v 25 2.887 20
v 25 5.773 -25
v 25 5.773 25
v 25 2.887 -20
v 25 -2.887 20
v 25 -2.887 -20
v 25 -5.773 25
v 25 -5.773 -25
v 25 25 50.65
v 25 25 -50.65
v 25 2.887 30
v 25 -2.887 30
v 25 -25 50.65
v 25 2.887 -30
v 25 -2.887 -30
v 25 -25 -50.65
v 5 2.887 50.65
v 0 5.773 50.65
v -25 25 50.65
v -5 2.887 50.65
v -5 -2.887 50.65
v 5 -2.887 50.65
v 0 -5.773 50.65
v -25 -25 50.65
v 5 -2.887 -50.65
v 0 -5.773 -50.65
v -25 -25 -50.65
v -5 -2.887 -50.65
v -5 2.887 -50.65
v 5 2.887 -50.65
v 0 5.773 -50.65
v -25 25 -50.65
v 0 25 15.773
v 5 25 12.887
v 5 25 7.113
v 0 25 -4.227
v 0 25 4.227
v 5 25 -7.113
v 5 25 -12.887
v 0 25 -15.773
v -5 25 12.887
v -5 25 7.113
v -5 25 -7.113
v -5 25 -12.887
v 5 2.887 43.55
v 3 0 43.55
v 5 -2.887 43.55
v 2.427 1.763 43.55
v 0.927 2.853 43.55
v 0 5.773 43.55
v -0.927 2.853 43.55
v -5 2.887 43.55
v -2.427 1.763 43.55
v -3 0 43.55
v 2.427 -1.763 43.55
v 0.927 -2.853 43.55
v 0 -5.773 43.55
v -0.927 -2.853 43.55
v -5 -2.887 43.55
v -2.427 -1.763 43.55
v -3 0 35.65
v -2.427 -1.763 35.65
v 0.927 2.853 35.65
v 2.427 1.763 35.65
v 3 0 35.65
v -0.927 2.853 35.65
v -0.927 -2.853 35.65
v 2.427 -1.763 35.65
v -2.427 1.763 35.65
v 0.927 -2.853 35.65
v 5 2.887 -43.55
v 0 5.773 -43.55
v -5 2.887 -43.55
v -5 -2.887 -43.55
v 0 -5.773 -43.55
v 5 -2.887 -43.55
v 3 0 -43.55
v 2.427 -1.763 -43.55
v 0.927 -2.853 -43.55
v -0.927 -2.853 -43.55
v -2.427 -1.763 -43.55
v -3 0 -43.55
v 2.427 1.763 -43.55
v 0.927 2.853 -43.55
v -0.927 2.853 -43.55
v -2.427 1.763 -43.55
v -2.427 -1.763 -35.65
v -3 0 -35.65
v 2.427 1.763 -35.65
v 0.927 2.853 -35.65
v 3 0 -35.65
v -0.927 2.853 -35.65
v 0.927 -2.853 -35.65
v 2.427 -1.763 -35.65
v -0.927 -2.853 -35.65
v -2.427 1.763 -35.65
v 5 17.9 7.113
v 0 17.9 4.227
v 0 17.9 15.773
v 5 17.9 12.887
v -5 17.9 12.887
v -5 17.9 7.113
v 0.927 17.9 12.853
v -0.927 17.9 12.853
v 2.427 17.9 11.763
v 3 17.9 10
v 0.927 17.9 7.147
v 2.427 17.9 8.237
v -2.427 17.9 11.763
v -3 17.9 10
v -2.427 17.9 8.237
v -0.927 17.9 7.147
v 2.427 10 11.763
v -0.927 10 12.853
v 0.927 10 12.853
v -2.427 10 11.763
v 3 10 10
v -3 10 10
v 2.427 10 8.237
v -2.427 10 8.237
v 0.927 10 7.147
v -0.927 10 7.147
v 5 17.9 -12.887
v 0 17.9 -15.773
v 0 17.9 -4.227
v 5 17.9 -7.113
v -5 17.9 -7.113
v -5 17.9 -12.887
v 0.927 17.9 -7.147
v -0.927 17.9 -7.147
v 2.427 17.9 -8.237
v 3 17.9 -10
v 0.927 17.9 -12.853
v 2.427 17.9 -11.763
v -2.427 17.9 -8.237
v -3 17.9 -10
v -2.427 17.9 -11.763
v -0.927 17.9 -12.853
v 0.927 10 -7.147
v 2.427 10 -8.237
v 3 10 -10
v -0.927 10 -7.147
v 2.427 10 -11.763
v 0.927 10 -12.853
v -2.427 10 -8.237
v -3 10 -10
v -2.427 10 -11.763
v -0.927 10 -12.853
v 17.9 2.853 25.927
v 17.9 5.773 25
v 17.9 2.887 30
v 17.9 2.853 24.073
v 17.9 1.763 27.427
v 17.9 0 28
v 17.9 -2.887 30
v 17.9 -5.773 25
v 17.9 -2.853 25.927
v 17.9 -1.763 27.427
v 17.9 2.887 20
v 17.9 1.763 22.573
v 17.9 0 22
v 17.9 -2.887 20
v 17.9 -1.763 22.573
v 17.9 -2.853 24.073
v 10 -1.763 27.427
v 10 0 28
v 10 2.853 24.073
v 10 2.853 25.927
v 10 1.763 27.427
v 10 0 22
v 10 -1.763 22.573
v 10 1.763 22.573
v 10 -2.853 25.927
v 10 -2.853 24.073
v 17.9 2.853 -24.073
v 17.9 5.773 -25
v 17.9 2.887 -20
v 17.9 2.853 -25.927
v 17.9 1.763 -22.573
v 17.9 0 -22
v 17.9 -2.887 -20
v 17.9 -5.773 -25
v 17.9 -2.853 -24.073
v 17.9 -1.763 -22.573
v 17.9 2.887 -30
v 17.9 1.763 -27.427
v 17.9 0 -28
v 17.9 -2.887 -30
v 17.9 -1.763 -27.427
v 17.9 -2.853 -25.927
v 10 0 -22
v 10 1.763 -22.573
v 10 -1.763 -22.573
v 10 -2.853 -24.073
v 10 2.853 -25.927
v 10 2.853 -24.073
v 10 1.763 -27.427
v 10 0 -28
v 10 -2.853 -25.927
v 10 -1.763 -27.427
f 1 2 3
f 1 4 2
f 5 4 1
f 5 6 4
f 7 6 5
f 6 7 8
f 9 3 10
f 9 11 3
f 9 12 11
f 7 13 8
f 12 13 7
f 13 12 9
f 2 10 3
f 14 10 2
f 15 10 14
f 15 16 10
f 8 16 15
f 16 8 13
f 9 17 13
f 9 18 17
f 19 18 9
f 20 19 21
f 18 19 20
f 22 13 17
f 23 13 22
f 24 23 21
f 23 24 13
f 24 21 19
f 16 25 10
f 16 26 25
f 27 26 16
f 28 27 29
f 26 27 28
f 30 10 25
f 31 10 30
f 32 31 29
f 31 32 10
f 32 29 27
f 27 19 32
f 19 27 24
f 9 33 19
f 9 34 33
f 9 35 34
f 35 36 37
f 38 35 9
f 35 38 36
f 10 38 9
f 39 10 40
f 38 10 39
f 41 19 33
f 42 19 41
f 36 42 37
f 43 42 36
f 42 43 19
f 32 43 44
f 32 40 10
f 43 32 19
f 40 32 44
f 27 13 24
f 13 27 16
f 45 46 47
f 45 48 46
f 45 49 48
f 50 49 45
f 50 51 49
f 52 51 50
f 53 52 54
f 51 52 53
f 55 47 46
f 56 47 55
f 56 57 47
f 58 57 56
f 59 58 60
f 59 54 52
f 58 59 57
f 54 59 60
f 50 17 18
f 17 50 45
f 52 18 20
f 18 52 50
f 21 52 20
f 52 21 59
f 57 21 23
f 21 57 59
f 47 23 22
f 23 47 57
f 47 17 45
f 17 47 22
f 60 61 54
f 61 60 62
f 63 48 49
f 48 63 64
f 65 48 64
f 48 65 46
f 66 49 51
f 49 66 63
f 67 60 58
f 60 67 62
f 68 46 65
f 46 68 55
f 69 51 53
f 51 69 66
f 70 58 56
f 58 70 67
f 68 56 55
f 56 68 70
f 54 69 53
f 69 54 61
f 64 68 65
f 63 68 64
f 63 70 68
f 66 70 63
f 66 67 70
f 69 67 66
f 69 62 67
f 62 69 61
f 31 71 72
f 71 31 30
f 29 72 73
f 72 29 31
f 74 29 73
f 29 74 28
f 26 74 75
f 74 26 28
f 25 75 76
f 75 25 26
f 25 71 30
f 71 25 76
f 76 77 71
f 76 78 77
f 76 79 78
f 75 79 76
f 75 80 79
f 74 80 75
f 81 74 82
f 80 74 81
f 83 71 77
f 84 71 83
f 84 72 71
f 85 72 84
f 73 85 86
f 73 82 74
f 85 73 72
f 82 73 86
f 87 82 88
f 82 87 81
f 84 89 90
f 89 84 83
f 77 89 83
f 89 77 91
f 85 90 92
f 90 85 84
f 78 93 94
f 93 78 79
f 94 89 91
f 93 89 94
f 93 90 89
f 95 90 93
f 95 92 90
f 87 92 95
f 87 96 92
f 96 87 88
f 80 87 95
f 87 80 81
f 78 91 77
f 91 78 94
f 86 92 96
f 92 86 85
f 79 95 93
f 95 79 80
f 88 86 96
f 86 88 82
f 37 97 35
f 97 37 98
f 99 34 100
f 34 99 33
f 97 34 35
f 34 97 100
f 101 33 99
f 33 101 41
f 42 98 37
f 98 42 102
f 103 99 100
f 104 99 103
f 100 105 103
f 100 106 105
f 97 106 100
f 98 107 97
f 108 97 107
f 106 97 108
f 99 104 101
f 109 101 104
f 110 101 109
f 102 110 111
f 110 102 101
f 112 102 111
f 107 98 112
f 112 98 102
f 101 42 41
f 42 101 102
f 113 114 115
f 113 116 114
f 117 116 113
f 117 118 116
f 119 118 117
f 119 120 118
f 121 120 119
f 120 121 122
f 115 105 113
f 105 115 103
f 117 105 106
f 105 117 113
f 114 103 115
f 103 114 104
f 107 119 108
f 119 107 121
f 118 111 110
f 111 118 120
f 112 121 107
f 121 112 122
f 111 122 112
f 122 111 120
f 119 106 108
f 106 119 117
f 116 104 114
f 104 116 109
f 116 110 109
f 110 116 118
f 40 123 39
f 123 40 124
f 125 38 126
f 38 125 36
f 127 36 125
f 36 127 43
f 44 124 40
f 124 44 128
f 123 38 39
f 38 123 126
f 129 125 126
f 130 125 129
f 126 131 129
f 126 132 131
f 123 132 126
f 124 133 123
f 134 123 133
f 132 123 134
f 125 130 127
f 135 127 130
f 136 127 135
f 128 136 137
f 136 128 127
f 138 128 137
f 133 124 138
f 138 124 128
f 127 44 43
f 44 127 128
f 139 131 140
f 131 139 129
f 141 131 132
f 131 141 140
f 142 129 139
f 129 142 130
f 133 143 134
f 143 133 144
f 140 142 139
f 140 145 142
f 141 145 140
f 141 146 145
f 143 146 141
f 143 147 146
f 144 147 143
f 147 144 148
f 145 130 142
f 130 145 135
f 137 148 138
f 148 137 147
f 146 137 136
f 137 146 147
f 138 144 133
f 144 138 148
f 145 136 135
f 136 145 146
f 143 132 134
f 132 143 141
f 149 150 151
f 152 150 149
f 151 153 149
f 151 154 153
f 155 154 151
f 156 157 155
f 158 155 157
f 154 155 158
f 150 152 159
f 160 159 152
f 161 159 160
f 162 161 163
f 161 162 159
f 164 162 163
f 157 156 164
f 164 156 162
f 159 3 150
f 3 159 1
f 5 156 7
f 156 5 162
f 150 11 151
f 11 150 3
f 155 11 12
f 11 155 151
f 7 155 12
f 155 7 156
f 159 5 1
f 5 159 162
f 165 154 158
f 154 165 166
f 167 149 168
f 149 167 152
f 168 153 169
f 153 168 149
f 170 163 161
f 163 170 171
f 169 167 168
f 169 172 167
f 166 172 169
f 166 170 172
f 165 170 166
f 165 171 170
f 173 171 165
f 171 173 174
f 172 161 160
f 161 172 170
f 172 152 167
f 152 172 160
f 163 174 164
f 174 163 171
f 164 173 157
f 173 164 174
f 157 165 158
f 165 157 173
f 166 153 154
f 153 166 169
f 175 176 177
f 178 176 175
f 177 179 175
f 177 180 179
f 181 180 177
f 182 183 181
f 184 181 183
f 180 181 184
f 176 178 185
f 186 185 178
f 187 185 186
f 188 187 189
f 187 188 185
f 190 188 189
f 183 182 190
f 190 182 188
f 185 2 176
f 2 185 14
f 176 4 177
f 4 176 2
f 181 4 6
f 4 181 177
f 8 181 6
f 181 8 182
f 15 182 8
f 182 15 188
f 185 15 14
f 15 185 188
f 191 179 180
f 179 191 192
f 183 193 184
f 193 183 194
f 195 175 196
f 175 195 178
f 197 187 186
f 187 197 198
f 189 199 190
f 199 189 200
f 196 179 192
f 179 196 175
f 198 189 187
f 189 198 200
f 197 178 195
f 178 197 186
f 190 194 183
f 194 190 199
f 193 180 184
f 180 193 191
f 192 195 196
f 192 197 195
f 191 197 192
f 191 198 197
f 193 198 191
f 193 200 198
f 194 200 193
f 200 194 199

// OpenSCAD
//import("acrylic_nut.stl");
block_width=50;
block_height=101.3;
hex_side_length=5.7735;

hex_height=7;
hex_offset=0.2;

bolt_height=15;
bolt_radius=3;
bolt_offset_1=10;
bolt_offset_2=25;

difference() {
    cube(size=[block_width, block_width, block_height],center=true);
    
    translate([0,0,block_height/2-hex_height/2])
        hexagon(hex_side_length, hex_height+hex_offset);
    translate([0,0,block_height/2-bolt_height/2])
        cylinder(h=bolt_height, r=bolt_radius, center=true);
    
    translate([0,0,-1*block_height/2+hex_height/2])
        hexagon(hex_side_length, hex_height+hex_offset);
    translate([0,0,-1*block_height/2+bolt_height/2])
        cylinder(h=bolt_height, r=bolt_radius, center=true);
    
    translate([0,block_width/2-hex_height/2, bolt_offset_1])
        rotate([90,0,0])
            hexagon(hex_side_length, hex_height+hex_offset);
    translate([0,block_width/2-bolt_height/2, bolt_offset_1])
        rotate([90,0,0])
            cylinder(h=bolt_height, r=bolt_radius, center=true);
    
    translate([0,block_width/2-hex_height/2, -1*bolt_offset_1])
        rotate([90,0,0])
            hexagon(hex_side_length, hex_height+hex_offset);
    translate([0,block_width/2-bolt_height/2, -1*bolt_offset_1])
        rotate([90,0,0])
            cylinder(h=bolt_height, r=bolt_radius, center=true);
            
    translate([block_width/2-hex_height/2, 0, bolt_offset_2])
        rotate([0,90,0])
            hexagon(hex_side_length, hex_height+hex_offset);
    translate([block_width/2-bolt_height/2, 0, bolt_offset_2])
        rotate([0,90,0])
            cylinder(h=bolt_height, r=bolt_radius, center=true);
            
     translate([block_width/2-hex_height/2, 0, -1*bolt_offset_2])
        rotate([0,90,0])
            hexagon(hex_side_length, hex_height+hex_offset);
    translate([block_width/2-bolt_height/2, 0, -1*bolt_offset_2])
        rotate([0,90,0])
            cylinder(h=bolt_height, r=bolt_radius, center=true);
}

module hexagon(size, height) {
    linear_extrude(height=height, center=true)
    polygon(points=[[size*sqrt(3)/2, size/2],[0, size],[-1*size*sqrt(3)/2, size/2],[-1*size*sqrt(3)/2, -1*size/2],[0, -1*size], [size*sqrt(3)/2, -1*size/2]]);
}
